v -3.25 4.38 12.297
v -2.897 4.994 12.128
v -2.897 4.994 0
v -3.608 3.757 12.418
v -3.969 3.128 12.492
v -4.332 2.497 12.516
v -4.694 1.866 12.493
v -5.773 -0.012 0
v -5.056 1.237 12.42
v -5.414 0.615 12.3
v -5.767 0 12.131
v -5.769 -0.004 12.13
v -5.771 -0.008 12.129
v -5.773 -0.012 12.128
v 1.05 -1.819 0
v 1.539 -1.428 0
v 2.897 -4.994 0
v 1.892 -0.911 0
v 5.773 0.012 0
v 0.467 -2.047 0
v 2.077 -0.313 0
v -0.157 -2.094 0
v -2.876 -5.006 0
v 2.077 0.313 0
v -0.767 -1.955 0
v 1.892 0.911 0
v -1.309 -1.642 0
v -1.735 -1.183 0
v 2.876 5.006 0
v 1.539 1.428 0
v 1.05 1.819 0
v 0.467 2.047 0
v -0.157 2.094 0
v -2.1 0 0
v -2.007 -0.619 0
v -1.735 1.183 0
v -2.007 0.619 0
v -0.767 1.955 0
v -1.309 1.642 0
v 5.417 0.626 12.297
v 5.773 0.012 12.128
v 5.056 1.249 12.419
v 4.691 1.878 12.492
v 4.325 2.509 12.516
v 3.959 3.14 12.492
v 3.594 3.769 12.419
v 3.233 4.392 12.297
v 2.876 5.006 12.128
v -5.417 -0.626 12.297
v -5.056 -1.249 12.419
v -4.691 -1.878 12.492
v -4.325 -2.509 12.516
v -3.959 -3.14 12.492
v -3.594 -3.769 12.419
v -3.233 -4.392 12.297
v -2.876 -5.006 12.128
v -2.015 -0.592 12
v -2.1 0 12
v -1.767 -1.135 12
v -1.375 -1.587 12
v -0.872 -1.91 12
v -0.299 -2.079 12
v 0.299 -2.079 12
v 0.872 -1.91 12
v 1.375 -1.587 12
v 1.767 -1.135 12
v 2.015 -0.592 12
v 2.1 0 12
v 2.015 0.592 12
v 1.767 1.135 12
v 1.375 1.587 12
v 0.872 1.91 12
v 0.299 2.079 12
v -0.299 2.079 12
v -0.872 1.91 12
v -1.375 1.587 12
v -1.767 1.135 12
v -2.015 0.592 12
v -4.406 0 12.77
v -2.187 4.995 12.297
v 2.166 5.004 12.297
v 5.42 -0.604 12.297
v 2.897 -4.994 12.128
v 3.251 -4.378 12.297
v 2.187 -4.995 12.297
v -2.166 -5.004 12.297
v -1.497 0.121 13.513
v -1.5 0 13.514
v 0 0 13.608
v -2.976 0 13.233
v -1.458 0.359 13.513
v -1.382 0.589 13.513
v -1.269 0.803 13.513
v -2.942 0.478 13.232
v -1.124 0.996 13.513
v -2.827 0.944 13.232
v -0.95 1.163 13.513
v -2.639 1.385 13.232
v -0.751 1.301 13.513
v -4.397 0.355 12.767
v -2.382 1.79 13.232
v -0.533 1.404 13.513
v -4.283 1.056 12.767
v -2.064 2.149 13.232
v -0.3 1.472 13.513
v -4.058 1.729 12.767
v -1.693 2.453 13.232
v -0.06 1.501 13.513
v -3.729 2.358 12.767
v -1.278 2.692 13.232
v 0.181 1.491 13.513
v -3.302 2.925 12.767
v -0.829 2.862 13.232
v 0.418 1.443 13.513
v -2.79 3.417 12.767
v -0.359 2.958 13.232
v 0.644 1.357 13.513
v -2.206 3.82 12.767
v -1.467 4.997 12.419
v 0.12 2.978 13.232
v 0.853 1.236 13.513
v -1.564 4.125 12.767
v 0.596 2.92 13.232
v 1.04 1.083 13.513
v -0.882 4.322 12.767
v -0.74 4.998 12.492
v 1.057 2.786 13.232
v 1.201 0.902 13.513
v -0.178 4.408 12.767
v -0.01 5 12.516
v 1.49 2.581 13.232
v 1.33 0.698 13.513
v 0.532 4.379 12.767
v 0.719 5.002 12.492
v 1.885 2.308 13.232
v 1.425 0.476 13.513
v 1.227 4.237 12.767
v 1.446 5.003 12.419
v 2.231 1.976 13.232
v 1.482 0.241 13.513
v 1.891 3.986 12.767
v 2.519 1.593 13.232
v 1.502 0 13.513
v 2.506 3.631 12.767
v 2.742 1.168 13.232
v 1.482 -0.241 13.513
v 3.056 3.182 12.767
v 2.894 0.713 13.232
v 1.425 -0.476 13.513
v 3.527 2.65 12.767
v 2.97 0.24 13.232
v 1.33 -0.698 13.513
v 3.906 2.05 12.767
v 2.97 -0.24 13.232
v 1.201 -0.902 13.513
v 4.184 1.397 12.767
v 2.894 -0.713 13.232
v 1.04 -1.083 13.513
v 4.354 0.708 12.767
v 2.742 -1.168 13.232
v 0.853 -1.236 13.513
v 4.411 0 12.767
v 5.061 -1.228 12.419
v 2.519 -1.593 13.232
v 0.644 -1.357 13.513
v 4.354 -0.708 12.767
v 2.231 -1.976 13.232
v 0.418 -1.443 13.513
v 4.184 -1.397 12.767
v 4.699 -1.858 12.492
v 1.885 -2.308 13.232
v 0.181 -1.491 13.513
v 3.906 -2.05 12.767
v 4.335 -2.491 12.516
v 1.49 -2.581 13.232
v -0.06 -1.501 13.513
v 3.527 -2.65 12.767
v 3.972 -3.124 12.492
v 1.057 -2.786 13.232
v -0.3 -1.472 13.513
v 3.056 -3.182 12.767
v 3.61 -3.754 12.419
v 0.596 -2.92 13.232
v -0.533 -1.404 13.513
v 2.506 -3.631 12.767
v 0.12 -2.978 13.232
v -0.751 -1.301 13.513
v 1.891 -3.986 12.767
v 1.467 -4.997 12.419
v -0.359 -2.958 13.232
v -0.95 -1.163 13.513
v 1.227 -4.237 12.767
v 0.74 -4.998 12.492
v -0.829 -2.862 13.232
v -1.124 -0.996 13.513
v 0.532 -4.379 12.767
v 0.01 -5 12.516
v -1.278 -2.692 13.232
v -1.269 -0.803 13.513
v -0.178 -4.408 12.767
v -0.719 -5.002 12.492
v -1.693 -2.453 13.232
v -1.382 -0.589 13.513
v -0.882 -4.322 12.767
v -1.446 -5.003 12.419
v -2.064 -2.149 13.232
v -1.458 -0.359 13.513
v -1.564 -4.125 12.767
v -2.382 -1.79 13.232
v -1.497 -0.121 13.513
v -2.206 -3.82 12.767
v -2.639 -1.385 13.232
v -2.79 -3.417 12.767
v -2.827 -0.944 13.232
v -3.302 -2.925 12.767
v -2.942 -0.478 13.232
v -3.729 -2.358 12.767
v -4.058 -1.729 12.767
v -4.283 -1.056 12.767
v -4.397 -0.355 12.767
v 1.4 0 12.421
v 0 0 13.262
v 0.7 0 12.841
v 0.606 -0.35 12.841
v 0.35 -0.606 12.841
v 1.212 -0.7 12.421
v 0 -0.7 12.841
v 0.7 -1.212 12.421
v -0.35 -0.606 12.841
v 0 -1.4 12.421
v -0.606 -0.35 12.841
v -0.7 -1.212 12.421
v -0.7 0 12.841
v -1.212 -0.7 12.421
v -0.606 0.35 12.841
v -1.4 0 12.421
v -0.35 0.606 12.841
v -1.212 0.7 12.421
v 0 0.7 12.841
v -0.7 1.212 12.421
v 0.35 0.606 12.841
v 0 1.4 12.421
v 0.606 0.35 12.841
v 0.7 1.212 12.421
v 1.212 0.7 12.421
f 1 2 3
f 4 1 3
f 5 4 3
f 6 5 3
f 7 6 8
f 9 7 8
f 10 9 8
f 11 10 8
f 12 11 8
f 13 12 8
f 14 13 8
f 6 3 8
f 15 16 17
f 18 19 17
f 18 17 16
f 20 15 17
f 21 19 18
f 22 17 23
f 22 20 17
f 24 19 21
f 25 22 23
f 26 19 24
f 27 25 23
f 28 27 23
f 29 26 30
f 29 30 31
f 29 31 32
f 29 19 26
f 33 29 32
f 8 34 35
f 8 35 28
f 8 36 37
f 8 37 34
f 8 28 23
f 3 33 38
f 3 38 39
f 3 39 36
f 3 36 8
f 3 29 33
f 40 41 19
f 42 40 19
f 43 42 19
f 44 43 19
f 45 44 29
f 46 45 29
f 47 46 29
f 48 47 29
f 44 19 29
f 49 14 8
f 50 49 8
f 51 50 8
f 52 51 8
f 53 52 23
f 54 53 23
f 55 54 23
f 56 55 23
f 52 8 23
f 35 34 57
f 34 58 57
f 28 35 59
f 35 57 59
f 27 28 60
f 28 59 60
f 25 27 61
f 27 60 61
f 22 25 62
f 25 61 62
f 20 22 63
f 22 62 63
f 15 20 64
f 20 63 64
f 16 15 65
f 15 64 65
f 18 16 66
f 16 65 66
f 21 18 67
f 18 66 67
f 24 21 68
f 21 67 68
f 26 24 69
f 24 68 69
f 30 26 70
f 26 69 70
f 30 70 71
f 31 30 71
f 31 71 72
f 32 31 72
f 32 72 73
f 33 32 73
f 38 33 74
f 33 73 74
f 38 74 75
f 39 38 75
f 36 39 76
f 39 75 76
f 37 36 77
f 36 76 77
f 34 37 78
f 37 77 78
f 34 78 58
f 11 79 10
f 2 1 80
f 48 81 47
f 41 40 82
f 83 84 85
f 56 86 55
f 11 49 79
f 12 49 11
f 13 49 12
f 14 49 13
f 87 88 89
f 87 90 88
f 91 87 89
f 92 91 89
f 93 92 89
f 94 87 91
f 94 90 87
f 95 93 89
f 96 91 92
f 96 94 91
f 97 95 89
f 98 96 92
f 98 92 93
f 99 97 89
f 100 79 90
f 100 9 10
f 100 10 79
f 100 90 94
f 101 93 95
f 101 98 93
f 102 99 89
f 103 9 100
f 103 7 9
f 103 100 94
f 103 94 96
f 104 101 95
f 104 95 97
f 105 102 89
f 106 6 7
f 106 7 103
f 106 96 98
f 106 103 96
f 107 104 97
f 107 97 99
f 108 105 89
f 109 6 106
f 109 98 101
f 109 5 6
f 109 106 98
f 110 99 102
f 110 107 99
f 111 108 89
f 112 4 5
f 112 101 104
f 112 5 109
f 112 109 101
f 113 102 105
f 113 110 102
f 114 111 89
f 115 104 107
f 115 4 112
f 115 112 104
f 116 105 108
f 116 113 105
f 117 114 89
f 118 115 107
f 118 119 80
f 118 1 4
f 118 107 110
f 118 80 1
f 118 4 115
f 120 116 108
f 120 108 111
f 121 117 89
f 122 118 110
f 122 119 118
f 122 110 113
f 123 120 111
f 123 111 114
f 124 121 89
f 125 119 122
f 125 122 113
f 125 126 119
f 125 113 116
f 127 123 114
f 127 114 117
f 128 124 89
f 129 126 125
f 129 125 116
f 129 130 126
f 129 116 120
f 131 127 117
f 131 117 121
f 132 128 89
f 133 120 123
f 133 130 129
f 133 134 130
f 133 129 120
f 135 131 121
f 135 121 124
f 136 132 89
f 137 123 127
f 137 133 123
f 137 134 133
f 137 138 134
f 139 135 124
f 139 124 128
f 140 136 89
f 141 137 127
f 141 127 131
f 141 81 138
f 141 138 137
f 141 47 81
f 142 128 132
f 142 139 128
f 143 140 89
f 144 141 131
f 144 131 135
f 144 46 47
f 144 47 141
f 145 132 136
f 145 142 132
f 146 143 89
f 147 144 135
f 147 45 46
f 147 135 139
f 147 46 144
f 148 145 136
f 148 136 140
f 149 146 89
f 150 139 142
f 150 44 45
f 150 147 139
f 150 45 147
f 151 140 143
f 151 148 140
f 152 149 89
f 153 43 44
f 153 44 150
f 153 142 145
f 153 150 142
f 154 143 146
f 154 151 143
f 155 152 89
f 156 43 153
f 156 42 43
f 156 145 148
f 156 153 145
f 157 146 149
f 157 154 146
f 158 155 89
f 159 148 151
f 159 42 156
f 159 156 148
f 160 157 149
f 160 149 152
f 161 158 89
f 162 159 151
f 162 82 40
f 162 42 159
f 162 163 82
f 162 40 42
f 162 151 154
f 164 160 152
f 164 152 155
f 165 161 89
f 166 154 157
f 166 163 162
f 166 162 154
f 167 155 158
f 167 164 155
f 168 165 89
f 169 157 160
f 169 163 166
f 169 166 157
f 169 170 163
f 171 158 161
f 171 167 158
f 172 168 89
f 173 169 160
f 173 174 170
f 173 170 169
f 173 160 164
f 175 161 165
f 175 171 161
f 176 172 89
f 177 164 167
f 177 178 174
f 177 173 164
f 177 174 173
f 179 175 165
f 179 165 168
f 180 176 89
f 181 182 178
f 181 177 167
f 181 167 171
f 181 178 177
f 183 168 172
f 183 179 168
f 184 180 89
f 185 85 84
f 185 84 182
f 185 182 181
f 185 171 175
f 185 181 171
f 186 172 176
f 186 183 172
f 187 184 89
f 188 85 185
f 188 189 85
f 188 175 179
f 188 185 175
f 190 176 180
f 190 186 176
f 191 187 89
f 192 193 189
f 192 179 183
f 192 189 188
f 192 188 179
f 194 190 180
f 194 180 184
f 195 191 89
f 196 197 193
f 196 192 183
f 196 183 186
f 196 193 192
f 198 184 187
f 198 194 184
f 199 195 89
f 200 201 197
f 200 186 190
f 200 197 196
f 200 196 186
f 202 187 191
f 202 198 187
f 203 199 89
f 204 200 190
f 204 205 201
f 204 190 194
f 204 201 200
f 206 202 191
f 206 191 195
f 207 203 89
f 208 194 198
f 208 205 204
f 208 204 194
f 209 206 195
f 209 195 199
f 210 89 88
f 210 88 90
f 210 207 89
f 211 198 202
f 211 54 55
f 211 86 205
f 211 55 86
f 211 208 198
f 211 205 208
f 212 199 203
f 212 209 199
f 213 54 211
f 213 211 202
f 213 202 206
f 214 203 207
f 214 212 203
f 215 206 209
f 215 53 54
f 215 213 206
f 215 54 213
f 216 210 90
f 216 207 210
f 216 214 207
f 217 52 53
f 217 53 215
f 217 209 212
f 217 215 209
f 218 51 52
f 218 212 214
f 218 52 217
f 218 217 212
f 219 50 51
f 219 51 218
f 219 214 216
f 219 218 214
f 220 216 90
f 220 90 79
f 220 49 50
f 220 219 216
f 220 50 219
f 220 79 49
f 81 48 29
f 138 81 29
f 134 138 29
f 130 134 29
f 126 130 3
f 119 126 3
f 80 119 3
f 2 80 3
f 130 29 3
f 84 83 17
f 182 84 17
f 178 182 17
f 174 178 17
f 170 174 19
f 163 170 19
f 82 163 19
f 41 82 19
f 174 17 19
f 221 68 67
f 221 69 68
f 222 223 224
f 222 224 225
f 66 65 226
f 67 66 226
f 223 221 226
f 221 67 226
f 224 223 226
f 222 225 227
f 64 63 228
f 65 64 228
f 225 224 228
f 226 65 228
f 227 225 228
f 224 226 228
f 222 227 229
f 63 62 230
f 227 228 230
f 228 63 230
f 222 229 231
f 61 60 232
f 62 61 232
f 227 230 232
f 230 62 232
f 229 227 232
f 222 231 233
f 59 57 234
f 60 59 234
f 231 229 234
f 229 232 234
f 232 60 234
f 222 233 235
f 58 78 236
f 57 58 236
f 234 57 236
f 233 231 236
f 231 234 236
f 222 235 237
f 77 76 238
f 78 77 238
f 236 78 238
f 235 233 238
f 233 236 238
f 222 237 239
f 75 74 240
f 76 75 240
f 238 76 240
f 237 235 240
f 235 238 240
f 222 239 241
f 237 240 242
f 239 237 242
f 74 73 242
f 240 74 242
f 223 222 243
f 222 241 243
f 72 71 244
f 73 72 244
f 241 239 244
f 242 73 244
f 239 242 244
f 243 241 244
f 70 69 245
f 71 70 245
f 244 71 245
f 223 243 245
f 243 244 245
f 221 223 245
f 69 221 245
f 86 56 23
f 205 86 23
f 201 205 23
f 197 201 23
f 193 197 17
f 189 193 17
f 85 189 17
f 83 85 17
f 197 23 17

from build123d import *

# Parameters (mm, degrees)
F3_D     = 4.2
F3_DEPTH = 12
F3_TIP   = 1.2618073
F5_DEPTH = 13.6086951546


with BuildPart() as f1:
    # F0 (on Front) → F1 (revolve)
    with BuildSketch(Plane.XZ):
        with BuildLine():
            Line((-6, 12), (-6, 0))
            Line((-6, 0), (0, 0))
            Line((0, 0), (0, 13.6076951546))
            ThreePointArc((0, 13.6076951546), (-3.1058285412, 13.1988050701), (-6, 12))
        make_face()
    revolve(axis=Axis((0, 0, 6.8038475773), (0, 0, -1)))

    # F3
    with Locations(Plane(origin=(0, 0, 0), x_dir=(1, 0, 0), z_dir=(0, 0, -1))):
        with Locations((0, 0)):
            Hole(F3_D / 2, depth=F3_DEPTH)
            with Locations((0, 0, -(F3_DEPTH + F3_TIP / 2))):  # 118° drill point
                Cone(0, F3_D / 2, F3_TIP, mode=Mode.SUBTRACT)

    # F4 (on Top) → F5 (intersect, through all)
    with BuildSketch(Plane.XY):
        Polygon((-2.897095172, 4.9940137062), (-5.7734903224, -0.011951163), (-2.8763951504, -5.0059648692), (2.897095172, -4.9940137062), (5.7734903224, 0.011951163), (2.8763951504, 5.0059648692), align=None)
    extrude(amount=F5_DEPTH, mode=Mode.INTERSECT)


solid = f1.part
